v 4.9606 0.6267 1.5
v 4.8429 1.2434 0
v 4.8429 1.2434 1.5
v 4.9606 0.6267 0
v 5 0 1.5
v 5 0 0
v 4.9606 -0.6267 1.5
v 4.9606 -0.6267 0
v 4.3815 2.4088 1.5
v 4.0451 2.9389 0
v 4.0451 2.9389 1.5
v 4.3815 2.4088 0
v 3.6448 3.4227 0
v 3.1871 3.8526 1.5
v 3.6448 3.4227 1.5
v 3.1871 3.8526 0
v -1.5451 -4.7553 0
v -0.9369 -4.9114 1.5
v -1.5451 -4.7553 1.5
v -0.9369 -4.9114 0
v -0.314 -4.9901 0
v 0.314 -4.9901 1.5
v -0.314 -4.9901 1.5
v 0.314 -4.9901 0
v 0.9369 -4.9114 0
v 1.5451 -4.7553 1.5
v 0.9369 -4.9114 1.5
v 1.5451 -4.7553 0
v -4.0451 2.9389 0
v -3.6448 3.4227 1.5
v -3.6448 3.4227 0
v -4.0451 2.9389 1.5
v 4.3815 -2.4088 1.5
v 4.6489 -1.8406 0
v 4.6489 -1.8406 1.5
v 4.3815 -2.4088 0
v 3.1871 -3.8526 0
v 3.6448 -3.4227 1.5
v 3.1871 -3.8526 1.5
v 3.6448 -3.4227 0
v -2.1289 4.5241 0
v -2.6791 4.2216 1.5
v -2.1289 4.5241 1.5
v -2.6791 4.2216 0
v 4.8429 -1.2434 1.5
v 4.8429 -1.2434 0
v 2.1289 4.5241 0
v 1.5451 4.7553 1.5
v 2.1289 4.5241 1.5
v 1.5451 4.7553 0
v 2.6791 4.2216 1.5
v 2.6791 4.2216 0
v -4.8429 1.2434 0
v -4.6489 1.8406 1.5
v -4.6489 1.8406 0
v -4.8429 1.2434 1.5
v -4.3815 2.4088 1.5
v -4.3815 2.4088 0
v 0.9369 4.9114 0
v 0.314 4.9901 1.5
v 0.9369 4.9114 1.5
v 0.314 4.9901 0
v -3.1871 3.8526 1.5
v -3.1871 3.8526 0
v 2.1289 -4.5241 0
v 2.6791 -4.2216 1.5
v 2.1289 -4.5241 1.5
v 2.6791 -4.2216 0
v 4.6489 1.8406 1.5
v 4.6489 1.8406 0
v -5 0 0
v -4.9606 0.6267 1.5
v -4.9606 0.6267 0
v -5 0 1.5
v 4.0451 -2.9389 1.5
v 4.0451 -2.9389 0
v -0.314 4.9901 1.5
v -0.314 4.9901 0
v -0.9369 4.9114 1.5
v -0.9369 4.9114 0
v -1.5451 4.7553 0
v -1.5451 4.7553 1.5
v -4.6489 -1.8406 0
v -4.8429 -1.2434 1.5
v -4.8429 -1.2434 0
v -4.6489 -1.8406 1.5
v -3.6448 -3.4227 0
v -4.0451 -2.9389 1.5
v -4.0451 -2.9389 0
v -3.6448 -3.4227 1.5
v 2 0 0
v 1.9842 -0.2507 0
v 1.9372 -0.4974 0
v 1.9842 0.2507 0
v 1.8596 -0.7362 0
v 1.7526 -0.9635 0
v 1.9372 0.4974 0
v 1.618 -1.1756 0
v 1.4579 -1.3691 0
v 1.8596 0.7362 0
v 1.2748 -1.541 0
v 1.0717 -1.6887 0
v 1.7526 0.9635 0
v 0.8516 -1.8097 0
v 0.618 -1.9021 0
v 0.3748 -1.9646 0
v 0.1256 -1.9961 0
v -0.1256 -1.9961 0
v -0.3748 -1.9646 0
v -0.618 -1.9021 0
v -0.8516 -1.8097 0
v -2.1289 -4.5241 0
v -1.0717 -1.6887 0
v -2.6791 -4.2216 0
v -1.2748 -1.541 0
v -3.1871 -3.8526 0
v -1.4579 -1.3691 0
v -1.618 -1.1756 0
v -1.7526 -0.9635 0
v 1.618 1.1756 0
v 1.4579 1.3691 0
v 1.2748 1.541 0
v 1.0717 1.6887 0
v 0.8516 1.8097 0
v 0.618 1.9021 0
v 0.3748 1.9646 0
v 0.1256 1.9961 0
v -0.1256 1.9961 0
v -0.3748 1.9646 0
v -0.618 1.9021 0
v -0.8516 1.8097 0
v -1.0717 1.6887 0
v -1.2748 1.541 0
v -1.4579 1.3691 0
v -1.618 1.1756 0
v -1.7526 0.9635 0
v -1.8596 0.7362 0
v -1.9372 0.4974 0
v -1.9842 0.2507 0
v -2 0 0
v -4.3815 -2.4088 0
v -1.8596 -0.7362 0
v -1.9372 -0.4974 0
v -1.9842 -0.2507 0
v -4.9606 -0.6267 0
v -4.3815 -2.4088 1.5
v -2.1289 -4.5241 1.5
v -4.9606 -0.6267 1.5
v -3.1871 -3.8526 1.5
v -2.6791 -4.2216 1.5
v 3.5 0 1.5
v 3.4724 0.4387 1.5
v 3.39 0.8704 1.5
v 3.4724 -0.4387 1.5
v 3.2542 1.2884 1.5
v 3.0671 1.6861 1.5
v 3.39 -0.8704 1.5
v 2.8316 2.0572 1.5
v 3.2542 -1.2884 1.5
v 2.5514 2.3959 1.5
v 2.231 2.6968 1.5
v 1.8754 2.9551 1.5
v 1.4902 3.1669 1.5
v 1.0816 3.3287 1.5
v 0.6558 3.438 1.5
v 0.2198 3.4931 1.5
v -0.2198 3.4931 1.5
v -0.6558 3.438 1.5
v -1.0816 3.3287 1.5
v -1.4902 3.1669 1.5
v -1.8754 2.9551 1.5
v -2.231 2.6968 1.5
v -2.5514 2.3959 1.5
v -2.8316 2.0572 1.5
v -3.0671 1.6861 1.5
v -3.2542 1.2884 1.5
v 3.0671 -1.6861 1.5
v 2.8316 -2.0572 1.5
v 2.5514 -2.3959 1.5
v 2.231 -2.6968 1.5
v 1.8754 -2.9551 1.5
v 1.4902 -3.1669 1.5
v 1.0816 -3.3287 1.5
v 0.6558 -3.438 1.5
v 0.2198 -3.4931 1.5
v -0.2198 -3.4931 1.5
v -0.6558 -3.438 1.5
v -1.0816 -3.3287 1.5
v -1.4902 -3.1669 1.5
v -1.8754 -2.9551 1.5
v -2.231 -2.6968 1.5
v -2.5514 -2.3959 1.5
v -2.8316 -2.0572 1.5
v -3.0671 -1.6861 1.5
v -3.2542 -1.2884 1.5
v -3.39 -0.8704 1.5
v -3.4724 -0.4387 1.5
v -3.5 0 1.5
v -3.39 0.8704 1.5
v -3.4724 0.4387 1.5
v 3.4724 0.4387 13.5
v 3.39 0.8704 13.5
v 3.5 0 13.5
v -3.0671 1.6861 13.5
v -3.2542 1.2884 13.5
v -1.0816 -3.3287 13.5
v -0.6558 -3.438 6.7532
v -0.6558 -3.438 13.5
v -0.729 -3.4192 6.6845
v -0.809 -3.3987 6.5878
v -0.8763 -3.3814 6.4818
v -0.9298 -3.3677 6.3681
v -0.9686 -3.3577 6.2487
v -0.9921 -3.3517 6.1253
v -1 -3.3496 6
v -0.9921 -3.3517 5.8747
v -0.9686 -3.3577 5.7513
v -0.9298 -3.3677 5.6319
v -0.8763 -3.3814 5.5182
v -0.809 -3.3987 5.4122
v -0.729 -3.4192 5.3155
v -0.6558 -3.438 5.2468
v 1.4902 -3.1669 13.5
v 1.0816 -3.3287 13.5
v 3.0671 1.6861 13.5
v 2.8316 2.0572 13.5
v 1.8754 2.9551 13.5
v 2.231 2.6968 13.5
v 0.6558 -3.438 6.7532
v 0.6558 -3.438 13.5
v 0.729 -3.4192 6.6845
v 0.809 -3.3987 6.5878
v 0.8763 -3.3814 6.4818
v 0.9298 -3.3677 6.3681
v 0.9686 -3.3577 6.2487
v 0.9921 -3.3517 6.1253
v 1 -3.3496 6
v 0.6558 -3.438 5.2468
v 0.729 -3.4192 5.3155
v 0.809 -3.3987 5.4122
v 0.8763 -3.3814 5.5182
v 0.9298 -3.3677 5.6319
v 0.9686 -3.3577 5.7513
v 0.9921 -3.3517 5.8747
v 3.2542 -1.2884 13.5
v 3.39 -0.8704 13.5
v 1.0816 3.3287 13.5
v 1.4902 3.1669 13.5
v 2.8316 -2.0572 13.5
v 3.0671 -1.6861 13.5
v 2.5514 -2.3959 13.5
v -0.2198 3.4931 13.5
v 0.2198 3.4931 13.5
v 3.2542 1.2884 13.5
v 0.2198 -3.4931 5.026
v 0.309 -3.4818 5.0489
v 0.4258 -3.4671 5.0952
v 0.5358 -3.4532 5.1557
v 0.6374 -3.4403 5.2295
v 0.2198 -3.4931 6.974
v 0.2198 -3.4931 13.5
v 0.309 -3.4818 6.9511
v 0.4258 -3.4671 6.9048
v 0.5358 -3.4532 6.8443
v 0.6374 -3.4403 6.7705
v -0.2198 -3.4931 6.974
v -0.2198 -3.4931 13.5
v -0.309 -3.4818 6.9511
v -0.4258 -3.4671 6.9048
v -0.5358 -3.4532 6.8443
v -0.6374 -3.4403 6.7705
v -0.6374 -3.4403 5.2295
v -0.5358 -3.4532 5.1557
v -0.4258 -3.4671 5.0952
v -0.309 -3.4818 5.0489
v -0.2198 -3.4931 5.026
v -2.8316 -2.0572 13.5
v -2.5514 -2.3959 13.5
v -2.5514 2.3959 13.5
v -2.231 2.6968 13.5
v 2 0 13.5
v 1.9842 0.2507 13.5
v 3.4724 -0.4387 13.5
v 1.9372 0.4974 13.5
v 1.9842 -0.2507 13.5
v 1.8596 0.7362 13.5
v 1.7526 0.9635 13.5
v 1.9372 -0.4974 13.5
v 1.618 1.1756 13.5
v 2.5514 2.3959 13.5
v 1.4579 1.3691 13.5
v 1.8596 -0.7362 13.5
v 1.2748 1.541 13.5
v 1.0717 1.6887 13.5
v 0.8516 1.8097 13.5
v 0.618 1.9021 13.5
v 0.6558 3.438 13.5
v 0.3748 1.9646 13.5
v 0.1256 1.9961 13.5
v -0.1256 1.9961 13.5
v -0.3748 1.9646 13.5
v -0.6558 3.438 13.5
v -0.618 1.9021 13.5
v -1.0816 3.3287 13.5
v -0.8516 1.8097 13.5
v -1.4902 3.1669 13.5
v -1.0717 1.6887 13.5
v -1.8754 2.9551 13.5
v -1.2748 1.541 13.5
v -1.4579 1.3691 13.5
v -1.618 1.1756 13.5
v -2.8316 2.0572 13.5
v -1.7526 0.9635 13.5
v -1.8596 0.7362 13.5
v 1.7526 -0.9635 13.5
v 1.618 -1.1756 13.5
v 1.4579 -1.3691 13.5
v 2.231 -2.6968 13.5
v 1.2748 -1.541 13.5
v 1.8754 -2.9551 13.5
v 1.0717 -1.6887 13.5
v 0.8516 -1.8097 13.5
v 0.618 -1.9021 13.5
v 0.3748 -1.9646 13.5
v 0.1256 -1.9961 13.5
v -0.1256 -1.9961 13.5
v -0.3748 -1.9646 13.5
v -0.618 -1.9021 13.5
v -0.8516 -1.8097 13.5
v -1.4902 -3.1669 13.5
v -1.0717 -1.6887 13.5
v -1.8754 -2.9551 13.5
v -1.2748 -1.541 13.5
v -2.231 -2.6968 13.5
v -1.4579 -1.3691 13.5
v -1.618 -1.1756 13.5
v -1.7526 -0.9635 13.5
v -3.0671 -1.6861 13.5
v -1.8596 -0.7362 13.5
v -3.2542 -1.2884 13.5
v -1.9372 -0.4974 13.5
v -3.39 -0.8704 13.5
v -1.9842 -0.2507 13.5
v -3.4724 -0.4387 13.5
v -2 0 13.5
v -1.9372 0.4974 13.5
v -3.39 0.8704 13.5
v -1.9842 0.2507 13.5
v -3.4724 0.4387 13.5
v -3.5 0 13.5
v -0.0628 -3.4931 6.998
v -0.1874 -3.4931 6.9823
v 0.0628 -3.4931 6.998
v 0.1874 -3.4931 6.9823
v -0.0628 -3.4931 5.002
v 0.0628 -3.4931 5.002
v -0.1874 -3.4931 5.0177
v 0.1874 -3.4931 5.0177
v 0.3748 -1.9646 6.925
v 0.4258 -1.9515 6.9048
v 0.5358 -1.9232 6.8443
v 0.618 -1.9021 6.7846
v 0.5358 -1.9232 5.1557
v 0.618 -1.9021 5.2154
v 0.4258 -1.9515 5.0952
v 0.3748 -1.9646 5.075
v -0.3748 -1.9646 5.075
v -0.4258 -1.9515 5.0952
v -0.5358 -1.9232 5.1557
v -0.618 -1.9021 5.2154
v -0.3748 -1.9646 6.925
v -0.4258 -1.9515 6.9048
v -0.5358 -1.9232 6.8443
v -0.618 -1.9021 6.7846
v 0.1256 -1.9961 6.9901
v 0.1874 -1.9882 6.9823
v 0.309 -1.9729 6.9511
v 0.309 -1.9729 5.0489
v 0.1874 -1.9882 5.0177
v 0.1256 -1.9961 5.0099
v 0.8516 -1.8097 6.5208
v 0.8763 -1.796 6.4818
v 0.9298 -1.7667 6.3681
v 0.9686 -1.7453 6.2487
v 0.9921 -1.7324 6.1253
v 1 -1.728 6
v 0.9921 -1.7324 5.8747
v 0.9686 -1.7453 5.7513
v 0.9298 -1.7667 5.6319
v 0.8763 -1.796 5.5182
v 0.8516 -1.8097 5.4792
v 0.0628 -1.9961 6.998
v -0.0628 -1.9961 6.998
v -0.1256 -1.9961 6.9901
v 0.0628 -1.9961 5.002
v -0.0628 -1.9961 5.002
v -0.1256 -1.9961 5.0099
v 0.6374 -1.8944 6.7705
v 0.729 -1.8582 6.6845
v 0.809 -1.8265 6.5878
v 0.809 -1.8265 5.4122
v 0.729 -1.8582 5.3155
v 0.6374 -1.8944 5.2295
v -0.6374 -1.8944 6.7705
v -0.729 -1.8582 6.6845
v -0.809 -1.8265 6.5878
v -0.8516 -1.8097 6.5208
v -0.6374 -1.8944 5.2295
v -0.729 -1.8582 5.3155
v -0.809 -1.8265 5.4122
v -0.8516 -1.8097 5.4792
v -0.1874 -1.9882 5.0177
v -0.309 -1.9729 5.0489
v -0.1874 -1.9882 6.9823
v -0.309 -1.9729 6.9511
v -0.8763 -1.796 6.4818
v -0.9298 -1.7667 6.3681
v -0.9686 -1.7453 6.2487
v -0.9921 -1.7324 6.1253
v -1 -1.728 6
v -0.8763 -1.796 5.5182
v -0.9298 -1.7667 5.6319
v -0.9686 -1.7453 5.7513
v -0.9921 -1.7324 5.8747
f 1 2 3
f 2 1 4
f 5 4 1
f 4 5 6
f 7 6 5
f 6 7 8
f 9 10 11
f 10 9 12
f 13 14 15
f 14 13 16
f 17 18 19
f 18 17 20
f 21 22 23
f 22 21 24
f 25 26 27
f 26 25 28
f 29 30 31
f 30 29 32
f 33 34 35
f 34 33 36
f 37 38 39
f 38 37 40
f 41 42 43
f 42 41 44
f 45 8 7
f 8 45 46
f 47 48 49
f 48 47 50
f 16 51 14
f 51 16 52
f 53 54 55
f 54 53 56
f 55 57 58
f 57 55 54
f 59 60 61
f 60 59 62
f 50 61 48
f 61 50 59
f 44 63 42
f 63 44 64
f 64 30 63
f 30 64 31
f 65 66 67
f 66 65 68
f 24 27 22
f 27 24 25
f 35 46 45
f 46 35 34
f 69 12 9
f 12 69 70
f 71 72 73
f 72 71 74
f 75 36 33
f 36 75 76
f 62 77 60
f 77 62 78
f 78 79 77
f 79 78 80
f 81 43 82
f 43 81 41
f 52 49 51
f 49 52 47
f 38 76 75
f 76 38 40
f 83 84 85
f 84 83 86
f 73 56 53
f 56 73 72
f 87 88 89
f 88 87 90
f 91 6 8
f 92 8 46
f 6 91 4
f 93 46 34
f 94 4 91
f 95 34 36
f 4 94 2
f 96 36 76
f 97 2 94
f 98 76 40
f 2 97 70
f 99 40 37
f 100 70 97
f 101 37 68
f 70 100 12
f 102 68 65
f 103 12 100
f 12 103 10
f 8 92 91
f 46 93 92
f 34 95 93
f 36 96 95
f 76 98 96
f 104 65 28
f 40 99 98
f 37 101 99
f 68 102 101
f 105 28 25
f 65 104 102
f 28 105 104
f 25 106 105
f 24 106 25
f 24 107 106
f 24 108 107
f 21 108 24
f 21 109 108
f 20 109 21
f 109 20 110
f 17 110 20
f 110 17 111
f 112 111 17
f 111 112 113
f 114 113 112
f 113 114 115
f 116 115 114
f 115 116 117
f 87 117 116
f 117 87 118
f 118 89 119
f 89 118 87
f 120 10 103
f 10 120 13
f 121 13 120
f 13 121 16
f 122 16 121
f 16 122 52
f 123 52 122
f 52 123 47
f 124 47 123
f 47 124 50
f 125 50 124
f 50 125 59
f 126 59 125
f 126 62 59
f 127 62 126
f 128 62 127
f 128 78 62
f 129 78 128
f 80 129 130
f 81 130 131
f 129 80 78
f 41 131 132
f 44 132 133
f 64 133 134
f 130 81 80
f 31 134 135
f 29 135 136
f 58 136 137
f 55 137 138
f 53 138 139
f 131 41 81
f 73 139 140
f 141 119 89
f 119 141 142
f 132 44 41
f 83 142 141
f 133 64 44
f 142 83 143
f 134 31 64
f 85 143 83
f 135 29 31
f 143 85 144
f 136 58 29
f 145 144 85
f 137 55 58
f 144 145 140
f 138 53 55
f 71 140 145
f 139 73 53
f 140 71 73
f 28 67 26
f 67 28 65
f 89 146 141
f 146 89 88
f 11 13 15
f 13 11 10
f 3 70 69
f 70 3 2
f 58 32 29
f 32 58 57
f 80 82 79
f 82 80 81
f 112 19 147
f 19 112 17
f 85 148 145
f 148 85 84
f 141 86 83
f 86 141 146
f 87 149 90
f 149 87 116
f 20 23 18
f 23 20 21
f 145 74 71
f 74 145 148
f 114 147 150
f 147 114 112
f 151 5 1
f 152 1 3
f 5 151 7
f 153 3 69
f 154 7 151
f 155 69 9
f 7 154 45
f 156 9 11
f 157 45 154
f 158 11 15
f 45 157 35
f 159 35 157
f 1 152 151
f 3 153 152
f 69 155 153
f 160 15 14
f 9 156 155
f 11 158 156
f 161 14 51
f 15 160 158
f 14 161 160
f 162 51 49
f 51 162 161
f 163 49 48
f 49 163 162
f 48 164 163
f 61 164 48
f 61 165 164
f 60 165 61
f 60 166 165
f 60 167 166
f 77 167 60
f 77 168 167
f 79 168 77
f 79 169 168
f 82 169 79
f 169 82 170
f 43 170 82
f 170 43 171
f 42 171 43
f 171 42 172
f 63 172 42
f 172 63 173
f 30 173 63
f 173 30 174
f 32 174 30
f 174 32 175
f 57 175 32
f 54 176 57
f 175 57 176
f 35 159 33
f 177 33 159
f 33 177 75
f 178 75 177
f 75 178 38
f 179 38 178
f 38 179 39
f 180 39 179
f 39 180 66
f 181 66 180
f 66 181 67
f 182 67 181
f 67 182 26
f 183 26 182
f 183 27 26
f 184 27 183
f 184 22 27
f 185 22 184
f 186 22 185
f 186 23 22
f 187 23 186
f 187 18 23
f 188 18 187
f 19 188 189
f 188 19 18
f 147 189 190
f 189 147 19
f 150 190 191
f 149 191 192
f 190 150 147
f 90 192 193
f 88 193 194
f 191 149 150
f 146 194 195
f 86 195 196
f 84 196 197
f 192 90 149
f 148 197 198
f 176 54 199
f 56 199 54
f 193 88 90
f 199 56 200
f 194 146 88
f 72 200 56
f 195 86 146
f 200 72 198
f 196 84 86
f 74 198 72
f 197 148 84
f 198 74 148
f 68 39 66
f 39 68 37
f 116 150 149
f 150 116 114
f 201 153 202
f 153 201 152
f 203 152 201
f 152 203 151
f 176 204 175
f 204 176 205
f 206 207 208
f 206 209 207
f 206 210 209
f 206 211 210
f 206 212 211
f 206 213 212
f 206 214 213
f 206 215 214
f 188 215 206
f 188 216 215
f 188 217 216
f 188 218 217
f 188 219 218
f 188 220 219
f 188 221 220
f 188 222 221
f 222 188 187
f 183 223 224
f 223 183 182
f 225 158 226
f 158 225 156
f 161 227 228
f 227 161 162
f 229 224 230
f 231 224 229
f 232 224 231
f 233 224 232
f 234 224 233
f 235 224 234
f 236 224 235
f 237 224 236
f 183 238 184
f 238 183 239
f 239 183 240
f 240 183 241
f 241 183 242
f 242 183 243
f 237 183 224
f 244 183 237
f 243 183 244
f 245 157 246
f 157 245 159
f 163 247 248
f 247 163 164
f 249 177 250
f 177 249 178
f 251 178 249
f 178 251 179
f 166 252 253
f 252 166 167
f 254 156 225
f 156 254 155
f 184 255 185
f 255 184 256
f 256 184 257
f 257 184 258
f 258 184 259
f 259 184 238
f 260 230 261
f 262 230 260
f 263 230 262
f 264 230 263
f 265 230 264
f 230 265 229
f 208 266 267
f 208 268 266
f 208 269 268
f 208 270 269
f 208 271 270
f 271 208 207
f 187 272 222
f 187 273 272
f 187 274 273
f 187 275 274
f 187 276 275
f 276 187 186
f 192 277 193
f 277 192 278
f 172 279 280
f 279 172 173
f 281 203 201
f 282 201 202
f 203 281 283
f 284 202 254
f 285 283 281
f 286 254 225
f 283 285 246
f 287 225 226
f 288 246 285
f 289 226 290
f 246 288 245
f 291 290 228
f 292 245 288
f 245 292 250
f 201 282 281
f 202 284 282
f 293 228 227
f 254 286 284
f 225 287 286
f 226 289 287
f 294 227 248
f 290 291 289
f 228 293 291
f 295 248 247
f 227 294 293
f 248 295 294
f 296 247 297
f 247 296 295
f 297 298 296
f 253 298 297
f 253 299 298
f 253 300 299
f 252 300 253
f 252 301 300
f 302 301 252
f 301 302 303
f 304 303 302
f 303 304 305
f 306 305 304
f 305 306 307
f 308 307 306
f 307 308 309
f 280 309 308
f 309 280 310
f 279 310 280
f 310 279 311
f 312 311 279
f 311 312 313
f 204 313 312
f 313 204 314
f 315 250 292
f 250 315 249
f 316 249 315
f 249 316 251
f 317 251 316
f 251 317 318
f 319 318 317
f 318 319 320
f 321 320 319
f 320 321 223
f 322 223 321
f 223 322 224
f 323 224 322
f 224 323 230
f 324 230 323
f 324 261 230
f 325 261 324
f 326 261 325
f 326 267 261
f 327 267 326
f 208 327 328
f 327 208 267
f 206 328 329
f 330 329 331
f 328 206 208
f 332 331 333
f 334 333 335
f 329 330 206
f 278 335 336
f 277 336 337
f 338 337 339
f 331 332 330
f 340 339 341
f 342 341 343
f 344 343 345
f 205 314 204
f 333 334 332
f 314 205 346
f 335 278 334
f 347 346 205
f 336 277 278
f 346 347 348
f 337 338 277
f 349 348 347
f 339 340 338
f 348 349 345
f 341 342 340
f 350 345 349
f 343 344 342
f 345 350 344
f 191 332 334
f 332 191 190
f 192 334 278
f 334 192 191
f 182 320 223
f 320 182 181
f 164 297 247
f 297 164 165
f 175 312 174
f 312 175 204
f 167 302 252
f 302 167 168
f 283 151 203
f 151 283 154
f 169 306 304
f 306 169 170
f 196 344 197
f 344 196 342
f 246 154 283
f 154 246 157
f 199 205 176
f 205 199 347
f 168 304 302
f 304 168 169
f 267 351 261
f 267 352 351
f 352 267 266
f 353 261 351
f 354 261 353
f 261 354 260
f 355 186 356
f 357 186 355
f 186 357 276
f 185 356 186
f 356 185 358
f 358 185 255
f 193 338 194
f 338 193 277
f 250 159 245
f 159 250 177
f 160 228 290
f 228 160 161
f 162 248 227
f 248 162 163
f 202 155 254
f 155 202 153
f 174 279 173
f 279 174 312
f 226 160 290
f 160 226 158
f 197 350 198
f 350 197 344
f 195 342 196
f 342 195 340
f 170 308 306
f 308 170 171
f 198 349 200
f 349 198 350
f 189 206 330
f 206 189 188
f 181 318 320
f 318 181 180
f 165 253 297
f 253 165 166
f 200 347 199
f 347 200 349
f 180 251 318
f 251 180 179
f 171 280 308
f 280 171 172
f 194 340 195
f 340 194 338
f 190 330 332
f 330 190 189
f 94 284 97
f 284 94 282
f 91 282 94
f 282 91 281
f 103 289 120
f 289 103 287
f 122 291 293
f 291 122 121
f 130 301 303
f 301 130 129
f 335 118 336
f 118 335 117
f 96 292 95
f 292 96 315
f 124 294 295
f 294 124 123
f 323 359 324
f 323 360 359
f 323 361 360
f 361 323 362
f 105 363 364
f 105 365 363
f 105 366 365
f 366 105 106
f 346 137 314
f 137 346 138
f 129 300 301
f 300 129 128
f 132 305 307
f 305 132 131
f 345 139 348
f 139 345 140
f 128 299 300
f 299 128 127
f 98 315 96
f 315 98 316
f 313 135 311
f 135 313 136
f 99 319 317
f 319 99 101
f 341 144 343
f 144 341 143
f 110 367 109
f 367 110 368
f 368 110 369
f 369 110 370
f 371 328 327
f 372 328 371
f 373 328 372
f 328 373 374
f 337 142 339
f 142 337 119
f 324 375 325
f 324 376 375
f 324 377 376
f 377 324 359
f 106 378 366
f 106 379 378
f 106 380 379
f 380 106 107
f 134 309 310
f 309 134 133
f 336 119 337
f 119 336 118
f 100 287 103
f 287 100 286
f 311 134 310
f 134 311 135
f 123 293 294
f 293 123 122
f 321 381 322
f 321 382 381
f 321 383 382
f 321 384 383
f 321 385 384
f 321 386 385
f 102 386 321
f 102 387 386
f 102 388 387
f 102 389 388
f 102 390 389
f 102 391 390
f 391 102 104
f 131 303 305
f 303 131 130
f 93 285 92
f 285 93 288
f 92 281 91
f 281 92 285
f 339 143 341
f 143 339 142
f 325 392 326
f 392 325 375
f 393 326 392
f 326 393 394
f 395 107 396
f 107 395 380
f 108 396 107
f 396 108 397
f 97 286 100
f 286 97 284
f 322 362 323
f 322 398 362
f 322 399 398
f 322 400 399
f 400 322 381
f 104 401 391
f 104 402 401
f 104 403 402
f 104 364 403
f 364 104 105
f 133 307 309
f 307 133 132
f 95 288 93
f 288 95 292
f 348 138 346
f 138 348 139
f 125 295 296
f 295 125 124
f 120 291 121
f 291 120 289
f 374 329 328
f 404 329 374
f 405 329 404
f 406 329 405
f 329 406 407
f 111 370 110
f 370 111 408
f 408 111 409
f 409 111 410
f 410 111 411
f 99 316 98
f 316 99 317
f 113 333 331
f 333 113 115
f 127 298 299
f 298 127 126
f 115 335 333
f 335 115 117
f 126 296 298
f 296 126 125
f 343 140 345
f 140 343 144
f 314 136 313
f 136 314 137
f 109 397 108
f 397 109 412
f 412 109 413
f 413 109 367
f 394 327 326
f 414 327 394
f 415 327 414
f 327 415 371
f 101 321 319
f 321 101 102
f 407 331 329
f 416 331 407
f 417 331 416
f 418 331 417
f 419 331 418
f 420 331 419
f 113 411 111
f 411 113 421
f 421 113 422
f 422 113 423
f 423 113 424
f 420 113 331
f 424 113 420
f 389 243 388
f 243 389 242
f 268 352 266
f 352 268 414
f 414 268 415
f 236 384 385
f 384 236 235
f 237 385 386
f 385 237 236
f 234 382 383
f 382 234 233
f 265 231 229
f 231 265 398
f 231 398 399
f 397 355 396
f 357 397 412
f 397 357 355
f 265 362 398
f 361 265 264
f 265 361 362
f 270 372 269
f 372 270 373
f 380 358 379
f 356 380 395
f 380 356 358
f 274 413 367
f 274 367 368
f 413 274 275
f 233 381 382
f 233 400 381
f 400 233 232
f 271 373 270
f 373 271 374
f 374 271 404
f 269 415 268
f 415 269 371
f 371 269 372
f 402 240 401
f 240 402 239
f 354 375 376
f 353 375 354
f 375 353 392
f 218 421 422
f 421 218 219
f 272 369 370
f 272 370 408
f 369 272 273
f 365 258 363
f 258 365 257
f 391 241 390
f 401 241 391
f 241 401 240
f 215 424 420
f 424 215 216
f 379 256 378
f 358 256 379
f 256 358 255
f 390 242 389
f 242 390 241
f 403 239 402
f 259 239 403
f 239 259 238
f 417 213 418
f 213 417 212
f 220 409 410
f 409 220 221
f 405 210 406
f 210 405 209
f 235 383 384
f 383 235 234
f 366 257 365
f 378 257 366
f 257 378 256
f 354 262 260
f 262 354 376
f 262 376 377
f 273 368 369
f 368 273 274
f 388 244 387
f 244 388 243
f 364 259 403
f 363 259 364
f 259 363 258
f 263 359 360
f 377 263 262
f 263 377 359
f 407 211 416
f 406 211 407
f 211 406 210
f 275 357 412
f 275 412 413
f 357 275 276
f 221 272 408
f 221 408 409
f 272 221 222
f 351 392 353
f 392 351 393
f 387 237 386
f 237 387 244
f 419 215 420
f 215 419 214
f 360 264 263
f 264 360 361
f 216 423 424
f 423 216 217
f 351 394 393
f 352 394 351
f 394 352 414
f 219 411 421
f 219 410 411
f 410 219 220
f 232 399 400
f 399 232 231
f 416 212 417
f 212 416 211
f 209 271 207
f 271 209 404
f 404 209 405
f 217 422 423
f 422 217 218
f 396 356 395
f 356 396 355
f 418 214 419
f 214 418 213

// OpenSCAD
//number of fragments
$fn=50;//[25,50,100,150,200]
//height of the bushing lip
lip_height=1.5;
//diameter of the bushing lip
lip_diameter=10;
//height of the bushing barrel
barrel_height=12;
//outer diameter of the bushing barrel
barrel_diameter=7;
//inner diameter of the bushing
inner_diameter=4;
//set screw hole diameter
set_screw_diameter=2;
//set screw hole height
set_screw_height=6;
//number of set screw holes
set_screw_holes=1;//[0,1,2,4]
difference(){
    difference(){
        union(){
            //lip
            cylinder(h=lip_height,d=lip_diameter);
            //barrel
            translate([0,0,lip_height]){
                cylinder(h=barrel_height,d=barrel_diameter);
                }
            }

    //inner diameter
    cylinder(h=(barrel_height+lip_height),d=inner_diameter);
    }
    if (set_screw_holes == 1){
        translate([0,0,set_screw_height]){
            rotate([90,0,0]){
                cylinder(h=(barrel_diameter/2),d=set_screw_diameter);
            }
        }
    }
    if (set_screw_holes == 2){
        translate([0,(barrel_diameter/2),set_screw_height]){
            rotate([90,0,0]){
                cylinder(h=barrel_diameter,d=set_screw_diameter);
            }
        }
    }
    if (set_screw_holes == 3){
        translate([0,(barrel_diameter/2),set_screw_height]){
            rotate([90,0,0]){
                cylinder(h=barrel_diameter,d=set_screw_diameter);
            }
        }
    }
    if (set_screw_holes == 4){
        union(){
            translate([0,(barrel_diameter/2),set_screw_height]){
                rotate([90,0,0]){
                    cylinder(h=barrel_diameter,d=set_screw_diameter);
                }
            }
            translate([-(barrel_diameter/2),0,set_screw_height]){
                rotate([90,0,90]){
                    cylinder(h=barrel_diameter,d=set_screw_diameter);
                }
            }
        }
    }
}
